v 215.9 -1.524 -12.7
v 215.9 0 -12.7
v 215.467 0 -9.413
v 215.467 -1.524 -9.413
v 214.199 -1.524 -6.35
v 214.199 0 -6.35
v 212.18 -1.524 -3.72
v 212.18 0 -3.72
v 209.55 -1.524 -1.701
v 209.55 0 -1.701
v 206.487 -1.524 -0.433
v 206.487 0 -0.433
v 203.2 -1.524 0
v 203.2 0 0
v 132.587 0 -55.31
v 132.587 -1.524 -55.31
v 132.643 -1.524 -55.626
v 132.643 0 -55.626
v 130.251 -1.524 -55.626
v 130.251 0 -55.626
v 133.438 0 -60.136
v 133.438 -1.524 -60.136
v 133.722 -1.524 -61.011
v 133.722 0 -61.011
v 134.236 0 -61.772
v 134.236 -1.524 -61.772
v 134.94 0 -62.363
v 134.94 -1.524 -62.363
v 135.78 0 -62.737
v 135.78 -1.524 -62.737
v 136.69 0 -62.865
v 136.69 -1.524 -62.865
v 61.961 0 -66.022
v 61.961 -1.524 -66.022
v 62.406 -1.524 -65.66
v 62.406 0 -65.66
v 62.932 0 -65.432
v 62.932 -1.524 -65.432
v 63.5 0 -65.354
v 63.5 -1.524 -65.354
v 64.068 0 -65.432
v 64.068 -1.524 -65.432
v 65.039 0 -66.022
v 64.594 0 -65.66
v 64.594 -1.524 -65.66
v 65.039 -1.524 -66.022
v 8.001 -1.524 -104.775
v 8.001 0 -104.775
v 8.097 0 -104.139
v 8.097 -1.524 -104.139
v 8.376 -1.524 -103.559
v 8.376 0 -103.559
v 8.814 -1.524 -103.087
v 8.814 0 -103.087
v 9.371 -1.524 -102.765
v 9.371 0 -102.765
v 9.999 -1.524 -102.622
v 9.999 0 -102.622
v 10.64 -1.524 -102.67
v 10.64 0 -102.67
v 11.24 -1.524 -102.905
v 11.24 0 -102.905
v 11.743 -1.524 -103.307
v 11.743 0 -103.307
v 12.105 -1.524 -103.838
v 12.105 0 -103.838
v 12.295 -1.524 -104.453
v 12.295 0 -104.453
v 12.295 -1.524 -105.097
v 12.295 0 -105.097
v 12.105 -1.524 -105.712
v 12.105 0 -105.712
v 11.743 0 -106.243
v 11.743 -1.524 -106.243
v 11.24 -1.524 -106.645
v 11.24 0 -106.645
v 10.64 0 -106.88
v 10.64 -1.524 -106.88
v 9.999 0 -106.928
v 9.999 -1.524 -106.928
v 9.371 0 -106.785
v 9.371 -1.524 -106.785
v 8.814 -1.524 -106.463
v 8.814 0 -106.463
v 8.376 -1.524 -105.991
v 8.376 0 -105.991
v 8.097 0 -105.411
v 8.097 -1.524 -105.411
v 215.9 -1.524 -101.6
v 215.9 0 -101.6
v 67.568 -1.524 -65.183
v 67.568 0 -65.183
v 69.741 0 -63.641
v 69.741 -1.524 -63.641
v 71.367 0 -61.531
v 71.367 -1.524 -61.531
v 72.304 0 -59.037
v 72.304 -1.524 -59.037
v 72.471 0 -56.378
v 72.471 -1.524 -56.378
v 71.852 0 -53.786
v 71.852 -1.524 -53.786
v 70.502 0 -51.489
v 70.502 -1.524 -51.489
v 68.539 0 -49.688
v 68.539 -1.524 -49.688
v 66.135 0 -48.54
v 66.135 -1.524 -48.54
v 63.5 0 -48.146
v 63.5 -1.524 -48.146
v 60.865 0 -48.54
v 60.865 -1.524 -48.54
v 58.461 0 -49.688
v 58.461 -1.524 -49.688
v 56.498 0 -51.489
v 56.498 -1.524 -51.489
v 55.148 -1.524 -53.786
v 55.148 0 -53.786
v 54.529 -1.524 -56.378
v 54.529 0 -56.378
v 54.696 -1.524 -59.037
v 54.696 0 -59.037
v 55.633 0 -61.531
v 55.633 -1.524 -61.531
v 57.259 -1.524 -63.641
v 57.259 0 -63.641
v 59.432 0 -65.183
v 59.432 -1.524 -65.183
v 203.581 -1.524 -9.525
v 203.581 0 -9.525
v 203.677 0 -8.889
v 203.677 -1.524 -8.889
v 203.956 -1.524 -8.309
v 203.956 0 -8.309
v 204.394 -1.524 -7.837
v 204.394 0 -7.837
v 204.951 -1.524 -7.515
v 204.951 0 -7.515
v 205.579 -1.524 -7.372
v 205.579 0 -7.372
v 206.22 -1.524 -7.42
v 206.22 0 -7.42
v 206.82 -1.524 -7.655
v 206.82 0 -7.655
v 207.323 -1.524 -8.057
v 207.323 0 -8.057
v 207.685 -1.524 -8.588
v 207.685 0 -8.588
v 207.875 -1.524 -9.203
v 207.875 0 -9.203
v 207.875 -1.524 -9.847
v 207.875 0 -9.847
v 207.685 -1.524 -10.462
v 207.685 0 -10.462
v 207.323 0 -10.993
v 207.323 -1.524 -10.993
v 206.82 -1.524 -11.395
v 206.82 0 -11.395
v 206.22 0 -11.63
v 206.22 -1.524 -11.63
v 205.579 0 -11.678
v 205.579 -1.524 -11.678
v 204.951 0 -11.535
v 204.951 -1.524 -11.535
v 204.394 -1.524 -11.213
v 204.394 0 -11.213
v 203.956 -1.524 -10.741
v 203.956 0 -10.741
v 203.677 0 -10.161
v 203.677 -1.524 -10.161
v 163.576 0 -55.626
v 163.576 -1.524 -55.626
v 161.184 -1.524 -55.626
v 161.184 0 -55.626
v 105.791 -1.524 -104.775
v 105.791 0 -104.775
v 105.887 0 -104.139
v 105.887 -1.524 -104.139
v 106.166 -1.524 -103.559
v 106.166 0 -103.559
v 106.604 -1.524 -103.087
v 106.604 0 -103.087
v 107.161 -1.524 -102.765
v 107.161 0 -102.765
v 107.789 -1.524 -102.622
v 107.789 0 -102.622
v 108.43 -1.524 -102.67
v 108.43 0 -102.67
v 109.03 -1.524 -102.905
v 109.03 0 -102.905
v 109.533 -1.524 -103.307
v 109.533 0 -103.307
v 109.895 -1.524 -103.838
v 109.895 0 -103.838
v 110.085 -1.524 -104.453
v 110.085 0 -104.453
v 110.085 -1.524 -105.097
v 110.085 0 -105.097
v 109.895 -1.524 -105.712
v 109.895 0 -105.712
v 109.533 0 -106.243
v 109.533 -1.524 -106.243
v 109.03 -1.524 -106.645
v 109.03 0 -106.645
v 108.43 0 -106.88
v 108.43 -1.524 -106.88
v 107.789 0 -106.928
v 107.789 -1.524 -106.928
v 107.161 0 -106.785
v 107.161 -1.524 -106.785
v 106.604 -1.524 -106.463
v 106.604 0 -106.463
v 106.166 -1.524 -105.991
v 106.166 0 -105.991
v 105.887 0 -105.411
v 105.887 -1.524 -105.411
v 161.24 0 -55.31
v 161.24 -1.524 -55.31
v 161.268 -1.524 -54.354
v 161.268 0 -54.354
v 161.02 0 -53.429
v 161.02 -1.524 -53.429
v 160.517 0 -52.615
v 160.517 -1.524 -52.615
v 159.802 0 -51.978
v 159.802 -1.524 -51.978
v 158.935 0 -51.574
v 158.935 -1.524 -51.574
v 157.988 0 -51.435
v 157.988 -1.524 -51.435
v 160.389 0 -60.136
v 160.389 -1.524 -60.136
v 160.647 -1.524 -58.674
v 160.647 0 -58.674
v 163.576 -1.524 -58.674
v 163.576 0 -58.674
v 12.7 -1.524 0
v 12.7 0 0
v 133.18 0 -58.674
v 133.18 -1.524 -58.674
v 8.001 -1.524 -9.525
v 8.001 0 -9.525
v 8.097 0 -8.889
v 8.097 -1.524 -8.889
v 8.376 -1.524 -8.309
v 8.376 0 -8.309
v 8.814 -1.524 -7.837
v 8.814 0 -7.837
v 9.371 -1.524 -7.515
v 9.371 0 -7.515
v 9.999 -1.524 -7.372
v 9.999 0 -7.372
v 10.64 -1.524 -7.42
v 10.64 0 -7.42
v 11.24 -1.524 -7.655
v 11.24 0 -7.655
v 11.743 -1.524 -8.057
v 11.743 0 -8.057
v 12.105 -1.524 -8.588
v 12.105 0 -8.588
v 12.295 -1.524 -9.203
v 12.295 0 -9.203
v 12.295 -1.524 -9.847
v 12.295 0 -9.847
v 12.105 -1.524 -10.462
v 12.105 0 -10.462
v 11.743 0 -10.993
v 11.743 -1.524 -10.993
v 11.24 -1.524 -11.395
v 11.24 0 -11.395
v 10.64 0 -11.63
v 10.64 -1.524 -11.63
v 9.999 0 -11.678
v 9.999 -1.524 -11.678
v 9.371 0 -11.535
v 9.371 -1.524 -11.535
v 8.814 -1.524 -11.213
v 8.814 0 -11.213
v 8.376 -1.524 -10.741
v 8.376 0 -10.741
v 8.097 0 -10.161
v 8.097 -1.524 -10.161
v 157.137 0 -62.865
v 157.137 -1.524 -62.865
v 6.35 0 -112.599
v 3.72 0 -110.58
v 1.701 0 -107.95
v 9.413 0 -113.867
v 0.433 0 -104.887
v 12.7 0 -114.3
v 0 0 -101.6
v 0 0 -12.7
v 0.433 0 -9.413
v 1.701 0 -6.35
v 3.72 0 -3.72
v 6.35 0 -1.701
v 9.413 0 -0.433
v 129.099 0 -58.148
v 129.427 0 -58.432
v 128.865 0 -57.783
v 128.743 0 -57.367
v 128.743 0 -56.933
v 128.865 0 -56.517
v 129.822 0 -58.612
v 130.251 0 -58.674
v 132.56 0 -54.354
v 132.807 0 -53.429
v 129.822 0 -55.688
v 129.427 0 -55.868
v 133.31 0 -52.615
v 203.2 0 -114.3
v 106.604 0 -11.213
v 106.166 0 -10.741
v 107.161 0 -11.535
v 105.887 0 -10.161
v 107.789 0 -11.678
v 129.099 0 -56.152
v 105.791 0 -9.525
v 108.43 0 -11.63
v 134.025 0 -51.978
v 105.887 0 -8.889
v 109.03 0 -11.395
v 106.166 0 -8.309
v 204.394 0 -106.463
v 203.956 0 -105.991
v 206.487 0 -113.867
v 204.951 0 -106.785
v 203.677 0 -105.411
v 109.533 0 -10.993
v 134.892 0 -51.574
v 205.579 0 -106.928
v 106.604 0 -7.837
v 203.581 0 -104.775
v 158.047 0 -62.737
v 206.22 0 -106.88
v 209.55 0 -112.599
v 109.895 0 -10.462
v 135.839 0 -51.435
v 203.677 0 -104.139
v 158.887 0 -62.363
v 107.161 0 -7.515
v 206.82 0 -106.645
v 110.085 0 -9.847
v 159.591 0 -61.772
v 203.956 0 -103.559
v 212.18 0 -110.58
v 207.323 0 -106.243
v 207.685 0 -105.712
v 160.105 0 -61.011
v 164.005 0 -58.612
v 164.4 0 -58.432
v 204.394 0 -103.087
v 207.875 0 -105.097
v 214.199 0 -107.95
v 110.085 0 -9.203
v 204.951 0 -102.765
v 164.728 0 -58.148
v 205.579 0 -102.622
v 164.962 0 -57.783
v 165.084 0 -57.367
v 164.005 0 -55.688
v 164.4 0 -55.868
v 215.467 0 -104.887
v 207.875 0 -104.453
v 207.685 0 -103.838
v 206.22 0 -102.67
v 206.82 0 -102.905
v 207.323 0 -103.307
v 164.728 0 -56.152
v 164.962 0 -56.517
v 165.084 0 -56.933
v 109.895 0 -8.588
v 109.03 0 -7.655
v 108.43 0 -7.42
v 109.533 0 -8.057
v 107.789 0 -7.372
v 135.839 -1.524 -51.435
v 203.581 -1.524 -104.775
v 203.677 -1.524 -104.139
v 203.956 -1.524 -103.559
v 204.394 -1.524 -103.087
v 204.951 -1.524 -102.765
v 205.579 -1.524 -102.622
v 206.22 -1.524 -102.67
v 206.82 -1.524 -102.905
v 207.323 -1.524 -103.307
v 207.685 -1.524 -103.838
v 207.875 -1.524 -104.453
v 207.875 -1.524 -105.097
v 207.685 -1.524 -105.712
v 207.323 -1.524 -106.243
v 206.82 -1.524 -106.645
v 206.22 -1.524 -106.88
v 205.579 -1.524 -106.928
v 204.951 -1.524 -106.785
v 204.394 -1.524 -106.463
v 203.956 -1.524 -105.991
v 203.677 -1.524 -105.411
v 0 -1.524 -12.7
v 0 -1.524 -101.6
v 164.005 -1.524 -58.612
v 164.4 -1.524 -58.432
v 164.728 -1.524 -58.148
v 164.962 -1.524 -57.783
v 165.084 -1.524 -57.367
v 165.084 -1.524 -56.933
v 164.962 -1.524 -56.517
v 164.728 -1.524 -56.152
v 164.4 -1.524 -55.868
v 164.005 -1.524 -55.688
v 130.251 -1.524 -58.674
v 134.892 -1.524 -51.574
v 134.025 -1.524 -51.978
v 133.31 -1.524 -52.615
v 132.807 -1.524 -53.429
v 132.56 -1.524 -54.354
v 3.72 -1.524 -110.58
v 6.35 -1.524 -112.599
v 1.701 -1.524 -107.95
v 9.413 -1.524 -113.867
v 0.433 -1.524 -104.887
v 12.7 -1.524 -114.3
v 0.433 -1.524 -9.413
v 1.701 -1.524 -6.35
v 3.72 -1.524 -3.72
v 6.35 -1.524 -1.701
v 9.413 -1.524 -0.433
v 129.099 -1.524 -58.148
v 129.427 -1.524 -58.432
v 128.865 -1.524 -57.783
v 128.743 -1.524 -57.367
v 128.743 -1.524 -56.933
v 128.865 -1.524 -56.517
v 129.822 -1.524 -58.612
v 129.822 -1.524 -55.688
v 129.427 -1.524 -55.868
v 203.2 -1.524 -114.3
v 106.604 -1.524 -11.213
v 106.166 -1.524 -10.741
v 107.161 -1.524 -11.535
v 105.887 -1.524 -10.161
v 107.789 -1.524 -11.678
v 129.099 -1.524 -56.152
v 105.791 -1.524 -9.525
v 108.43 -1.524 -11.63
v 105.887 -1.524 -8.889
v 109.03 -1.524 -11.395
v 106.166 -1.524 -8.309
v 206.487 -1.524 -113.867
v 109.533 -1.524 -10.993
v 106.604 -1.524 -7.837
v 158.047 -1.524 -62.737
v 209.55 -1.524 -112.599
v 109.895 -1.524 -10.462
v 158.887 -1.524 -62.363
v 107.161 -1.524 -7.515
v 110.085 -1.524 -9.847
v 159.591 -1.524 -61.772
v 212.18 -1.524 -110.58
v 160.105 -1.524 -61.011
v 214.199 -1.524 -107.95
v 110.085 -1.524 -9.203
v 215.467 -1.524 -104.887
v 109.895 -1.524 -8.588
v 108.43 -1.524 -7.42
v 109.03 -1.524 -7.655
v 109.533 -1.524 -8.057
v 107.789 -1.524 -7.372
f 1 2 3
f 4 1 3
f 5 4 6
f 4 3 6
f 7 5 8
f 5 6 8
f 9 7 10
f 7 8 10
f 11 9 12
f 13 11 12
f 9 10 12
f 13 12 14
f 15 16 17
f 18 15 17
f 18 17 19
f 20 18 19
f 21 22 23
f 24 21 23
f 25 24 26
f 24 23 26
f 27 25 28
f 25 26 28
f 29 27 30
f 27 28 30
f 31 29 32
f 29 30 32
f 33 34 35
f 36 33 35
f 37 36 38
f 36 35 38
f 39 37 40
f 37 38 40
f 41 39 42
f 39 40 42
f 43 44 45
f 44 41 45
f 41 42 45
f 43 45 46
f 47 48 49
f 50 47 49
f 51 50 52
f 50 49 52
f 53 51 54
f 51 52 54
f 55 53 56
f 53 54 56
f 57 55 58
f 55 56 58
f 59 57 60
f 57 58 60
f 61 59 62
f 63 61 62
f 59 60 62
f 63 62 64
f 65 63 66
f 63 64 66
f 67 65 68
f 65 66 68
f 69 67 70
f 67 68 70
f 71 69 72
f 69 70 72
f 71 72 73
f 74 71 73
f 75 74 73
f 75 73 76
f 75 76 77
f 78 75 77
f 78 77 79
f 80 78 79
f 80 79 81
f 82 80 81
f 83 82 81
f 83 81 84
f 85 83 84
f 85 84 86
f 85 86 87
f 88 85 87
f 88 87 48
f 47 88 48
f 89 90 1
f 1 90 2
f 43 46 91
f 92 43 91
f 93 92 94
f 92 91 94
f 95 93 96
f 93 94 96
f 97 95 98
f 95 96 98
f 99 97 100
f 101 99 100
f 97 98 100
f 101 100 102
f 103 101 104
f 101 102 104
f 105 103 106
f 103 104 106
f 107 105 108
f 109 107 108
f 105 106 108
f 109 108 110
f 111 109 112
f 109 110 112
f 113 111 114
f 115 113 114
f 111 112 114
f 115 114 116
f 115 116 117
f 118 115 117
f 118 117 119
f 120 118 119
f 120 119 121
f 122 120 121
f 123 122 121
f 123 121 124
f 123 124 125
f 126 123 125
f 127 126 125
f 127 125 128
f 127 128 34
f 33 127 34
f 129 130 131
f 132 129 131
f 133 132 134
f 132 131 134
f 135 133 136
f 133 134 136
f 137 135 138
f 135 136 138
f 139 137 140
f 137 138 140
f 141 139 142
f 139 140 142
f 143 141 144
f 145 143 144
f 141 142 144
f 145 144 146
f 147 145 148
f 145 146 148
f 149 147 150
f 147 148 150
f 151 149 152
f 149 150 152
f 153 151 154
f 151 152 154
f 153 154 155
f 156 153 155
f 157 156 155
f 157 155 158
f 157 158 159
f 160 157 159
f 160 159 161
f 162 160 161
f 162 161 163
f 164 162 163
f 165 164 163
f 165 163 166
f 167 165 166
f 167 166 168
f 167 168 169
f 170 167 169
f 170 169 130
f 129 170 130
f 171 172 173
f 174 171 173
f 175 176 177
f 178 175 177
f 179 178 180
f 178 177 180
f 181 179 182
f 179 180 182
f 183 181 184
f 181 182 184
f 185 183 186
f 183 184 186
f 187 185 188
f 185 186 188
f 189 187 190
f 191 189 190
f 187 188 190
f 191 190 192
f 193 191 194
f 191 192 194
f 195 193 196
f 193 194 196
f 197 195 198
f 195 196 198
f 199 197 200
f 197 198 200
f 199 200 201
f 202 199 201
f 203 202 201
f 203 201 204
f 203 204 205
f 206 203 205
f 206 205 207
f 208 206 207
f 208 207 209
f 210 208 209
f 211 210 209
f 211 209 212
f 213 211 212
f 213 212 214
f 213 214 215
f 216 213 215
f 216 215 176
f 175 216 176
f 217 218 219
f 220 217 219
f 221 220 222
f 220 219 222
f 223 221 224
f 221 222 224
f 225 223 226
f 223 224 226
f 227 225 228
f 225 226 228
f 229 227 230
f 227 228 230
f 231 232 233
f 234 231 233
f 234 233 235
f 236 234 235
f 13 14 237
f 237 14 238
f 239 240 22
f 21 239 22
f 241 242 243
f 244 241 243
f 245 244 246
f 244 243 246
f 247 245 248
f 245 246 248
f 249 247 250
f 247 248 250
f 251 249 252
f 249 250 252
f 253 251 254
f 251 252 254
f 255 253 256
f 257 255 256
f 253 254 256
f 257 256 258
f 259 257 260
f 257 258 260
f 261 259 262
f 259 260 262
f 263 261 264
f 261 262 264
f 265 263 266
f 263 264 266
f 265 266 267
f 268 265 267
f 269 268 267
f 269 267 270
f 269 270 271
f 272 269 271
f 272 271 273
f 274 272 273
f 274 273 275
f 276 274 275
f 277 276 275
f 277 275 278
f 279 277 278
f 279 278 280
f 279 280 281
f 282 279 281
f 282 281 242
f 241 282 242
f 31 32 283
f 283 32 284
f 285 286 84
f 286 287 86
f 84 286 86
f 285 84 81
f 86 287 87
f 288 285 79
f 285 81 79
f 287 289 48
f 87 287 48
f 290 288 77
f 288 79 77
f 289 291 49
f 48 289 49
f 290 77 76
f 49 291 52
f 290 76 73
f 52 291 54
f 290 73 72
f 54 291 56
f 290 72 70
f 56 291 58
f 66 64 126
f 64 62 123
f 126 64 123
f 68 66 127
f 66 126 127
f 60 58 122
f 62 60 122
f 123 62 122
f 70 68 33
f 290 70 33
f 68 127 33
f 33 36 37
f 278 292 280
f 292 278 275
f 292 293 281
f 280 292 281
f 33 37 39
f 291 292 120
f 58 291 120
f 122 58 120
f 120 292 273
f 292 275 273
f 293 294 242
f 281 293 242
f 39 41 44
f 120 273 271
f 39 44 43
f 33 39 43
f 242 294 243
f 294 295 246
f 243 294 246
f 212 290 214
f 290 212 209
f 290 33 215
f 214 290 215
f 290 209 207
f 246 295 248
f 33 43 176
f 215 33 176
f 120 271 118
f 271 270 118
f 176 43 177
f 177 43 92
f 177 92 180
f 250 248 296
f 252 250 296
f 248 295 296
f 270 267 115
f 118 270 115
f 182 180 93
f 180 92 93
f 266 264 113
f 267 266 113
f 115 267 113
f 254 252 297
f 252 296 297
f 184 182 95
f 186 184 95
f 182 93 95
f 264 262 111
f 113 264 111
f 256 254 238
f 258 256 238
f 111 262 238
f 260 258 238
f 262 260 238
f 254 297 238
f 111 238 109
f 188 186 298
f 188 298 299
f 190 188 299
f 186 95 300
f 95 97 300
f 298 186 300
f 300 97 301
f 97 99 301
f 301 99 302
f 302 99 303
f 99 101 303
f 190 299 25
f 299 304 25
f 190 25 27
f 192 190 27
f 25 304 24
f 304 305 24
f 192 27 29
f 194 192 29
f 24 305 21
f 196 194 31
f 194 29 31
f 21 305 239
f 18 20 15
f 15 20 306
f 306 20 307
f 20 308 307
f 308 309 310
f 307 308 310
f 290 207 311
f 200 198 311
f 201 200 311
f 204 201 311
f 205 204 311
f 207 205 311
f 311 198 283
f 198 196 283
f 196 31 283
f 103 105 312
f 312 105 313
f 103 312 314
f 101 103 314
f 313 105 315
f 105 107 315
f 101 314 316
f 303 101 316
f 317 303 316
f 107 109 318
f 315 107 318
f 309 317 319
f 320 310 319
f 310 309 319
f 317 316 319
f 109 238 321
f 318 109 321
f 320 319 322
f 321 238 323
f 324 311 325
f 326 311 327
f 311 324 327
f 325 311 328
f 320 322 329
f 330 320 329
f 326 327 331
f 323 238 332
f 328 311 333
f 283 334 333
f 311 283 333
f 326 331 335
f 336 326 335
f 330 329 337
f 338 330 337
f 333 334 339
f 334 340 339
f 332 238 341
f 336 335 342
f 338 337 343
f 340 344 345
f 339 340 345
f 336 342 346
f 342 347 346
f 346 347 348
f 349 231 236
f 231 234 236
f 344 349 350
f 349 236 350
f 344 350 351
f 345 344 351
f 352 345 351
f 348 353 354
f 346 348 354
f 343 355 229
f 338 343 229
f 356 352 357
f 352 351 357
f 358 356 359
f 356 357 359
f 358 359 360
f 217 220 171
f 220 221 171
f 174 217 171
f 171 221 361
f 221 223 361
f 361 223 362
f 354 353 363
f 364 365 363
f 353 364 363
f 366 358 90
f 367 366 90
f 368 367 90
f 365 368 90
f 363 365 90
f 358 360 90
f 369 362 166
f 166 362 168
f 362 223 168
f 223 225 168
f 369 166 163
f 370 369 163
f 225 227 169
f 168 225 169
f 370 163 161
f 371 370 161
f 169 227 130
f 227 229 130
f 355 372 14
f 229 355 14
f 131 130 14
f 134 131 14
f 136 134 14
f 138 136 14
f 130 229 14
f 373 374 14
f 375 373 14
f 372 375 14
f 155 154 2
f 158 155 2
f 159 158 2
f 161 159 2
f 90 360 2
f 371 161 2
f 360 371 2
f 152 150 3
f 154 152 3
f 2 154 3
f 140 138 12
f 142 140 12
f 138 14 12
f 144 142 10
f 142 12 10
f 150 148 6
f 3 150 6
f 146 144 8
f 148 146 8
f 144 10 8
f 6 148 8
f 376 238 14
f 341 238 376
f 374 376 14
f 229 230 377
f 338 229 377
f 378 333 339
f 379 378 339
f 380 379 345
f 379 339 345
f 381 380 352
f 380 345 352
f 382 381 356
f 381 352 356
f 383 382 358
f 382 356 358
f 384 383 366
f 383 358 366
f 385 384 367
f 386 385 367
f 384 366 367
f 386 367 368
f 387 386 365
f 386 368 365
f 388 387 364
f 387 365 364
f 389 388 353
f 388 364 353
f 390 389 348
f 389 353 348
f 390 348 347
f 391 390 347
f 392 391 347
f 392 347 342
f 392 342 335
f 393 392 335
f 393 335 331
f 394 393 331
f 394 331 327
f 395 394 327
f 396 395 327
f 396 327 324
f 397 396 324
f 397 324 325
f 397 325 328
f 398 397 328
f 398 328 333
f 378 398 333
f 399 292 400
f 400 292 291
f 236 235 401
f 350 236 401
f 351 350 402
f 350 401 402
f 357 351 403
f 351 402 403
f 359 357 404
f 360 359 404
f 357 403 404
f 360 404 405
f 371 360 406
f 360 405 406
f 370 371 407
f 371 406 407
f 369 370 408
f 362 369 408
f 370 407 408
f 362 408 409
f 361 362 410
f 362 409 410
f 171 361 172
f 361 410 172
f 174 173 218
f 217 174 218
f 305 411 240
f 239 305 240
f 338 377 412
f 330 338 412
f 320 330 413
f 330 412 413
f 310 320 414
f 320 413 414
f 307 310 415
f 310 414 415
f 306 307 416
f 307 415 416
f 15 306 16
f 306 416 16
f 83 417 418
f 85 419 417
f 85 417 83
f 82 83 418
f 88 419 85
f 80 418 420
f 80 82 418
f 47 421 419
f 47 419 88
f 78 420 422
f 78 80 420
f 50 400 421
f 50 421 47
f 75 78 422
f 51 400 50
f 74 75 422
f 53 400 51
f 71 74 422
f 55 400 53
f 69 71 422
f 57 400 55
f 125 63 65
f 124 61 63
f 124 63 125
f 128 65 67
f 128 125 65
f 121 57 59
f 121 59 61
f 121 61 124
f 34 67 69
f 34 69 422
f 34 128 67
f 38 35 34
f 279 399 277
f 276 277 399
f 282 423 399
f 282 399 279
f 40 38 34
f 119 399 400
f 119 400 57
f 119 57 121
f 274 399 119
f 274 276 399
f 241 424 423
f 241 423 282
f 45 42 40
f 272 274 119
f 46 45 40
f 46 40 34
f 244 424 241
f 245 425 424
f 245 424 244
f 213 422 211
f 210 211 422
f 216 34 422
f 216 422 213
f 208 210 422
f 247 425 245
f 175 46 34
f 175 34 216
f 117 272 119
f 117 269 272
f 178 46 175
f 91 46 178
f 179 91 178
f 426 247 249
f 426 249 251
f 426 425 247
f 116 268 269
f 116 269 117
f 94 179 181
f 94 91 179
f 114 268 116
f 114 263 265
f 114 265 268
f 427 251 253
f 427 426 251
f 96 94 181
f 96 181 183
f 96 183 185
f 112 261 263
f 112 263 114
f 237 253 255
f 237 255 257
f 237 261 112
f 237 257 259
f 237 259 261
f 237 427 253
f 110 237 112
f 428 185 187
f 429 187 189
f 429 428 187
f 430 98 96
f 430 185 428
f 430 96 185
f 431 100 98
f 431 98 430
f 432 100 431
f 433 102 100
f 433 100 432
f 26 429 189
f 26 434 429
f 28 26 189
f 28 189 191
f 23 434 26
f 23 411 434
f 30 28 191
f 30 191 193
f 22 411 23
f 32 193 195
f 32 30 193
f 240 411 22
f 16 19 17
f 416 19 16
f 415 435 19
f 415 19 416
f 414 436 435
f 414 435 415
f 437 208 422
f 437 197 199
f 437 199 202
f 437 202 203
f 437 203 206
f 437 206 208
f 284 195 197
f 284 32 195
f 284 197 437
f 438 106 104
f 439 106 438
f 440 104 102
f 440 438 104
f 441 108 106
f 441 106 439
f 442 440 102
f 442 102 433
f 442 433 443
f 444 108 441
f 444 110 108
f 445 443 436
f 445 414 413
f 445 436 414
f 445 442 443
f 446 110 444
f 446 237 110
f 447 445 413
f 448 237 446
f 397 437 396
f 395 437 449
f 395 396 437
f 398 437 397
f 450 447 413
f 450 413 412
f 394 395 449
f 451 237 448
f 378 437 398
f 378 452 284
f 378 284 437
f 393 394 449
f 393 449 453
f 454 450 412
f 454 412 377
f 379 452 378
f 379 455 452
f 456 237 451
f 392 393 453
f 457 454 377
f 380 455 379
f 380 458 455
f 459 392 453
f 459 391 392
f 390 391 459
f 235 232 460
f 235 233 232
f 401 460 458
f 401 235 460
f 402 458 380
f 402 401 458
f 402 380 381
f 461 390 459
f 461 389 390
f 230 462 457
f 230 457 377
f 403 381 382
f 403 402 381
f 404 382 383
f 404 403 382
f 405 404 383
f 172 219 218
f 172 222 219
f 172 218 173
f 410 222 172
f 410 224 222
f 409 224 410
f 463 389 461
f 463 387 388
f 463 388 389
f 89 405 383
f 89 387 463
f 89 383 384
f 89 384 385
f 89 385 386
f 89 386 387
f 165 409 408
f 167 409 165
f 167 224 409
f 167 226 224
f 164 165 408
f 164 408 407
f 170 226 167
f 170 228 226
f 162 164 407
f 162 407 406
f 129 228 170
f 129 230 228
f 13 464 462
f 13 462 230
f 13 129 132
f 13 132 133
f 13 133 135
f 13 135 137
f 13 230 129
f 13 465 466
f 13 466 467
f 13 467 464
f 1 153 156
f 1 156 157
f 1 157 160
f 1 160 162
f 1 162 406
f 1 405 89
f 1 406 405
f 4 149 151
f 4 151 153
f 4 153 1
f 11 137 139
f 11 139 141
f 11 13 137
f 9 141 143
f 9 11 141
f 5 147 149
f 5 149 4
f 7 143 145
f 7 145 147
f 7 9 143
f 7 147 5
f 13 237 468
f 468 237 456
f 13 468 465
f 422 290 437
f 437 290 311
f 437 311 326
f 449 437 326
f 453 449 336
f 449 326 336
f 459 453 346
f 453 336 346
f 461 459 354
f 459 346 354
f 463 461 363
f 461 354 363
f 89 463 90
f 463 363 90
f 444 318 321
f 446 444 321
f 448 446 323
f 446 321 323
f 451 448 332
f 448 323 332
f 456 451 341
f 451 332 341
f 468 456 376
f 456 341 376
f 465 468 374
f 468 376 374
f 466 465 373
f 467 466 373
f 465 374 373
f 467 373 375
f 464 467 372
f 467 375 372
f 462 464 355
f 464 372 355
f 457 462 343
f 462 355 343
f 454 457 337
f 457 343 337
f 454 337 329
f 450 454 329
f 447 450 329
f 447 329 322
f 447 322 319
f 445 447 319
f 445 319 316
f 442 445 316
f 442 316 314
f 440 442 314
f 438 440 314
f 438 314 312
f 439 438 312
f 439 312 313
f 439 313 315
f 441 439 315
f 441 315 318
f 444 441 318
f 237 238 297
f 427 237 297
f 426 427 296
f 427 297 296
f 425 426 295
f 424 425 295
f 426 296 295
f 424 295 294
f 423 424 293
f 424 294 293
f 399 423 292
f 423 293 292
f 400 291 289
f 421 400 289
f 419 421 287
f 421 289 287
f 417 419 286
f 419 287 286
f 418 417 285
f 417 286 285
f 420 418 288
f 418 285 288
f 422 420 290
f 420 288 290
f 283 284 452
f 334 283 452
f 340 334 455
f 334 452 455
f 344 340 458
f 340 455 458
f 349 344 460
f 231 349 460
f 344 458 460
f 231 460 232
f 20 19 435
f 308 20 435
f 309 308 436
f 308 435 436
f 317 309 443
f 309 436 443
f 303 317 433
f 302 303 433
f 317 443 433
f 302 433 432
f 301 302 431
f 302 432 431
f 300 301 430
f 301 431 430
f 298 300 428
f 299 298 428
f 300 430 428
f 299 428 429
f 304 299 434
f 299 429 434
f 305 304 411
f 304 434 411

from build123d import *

# Parameters (mm, degrees)
F1_DEPTH = 1.524
F3_DEPTH = 1.525
F5_D     = 4.318


with BuildPart() as f1:
    # F0 (on Front) → F1 (new body)
    with BuildSketch(Plane.XZ):
        with BuildLine():
            Line((203.2, 0), (12.7, 0))
            ThreePointArc((12.7, 0), (3.7197438789, -3.7197438789), (0, -12.7))
            Line((0, -12.7), (0, -101.6))
            ThreePointArc((0, -101.6), (3.7197438789, -110.5802561211), (12.7, -114.3))
            Line((12.7, -114.3), (203.2, -114.3))
            ThreePointArc((203.2, -114.3), (212.1802561211, -110.5802561211), (215.9, -101.6))
            Line((215.9, -101.6), (215.9, -12.7))
            ThreePointArc((215.9, -12.7), (212.1802561211, -3.7197438789), (203.2, 0))
        make_face()
    extrude(amount=F1_DEPTH)

    # F2 (on face) → F3 (cut, through all)
    with BuildSketch(Plane.XZ.offset(1.524)):
        with BuildLine():
            ThreePointArc((61.9608133082, -66.0217711207), (63.5, -65.3542), (65.0391866918, -66.0217711207))
            ThreePointArc((65.0391866918, -66.0217711207), (63.5, -48.1457), (61.9608133082, -66.0217711207))
        make_face()
        with BuildLine():
            ThreePointArc((157.1370459911, -62.865), (159.2595306783, -62.0924787512), (160.3888811915, -60.1363862827))
            Line((160.3888811915, -60.1363862827), (160.6467393494, -58.674))
            Line((160.6467393494, -58.674), (163.576, -58.674))
            ThreePointArc((163.576, -58.674), (165.1, -57.15), (163.576, -55.626))
            Line((163.576, -55.626), (161.1841839866, -55.626))
            Line((161.1841839866, -55.626), (161.2398352004, -55.3103862827))
            ThreePointArc((161.2398352004, -55.3103862827), (160.5174787512, -52.6145153128), (157.988, -51.435))
            Line((157.988, -51.435), (135.8392, -51.435))
            ThreePointArc((135.8392, -51.435), (133.3097212488, -52.6145153128), (132.5873647996, -55.3103862827))
            Line((132.5873647996, -55.3103862827), (132.6430160134, -55.626))
            Line((132.6430160134, -55.626), (130.2512, -55.626))
            ThreePointArc((130.2512, -55.626), (128.7272, -57.15), (130.2512, -58.674))
            Line((130.2512, -58.674), (133.1804606506, -58.674))
            Line((133.1804606506, -58.674), (133.4383188085, -60.1363862827))
            ThreePointArc((133.4383188085, -60.1363862827), (134.5676693217, -62.0924787512), (136.6901540089, -62.865))
            Line((136.6901540089, -62.865), (157.1370459911, -62.865))
        make_face()
    extrude(amount=-F3_DEPTH, mode=Mode.SUBTRACT)

    # F5 (through all)
    with Locations(Plane.XZ.offset(1.524)):
        with Locations((10.16, -9.525), (107.95, -9.525), (205.74, -9.525), (205.74, -104.775), (107.95, -104.775), (10.16, -104.775)):
            Hole(F5_D / 2)


solid = f1.part
